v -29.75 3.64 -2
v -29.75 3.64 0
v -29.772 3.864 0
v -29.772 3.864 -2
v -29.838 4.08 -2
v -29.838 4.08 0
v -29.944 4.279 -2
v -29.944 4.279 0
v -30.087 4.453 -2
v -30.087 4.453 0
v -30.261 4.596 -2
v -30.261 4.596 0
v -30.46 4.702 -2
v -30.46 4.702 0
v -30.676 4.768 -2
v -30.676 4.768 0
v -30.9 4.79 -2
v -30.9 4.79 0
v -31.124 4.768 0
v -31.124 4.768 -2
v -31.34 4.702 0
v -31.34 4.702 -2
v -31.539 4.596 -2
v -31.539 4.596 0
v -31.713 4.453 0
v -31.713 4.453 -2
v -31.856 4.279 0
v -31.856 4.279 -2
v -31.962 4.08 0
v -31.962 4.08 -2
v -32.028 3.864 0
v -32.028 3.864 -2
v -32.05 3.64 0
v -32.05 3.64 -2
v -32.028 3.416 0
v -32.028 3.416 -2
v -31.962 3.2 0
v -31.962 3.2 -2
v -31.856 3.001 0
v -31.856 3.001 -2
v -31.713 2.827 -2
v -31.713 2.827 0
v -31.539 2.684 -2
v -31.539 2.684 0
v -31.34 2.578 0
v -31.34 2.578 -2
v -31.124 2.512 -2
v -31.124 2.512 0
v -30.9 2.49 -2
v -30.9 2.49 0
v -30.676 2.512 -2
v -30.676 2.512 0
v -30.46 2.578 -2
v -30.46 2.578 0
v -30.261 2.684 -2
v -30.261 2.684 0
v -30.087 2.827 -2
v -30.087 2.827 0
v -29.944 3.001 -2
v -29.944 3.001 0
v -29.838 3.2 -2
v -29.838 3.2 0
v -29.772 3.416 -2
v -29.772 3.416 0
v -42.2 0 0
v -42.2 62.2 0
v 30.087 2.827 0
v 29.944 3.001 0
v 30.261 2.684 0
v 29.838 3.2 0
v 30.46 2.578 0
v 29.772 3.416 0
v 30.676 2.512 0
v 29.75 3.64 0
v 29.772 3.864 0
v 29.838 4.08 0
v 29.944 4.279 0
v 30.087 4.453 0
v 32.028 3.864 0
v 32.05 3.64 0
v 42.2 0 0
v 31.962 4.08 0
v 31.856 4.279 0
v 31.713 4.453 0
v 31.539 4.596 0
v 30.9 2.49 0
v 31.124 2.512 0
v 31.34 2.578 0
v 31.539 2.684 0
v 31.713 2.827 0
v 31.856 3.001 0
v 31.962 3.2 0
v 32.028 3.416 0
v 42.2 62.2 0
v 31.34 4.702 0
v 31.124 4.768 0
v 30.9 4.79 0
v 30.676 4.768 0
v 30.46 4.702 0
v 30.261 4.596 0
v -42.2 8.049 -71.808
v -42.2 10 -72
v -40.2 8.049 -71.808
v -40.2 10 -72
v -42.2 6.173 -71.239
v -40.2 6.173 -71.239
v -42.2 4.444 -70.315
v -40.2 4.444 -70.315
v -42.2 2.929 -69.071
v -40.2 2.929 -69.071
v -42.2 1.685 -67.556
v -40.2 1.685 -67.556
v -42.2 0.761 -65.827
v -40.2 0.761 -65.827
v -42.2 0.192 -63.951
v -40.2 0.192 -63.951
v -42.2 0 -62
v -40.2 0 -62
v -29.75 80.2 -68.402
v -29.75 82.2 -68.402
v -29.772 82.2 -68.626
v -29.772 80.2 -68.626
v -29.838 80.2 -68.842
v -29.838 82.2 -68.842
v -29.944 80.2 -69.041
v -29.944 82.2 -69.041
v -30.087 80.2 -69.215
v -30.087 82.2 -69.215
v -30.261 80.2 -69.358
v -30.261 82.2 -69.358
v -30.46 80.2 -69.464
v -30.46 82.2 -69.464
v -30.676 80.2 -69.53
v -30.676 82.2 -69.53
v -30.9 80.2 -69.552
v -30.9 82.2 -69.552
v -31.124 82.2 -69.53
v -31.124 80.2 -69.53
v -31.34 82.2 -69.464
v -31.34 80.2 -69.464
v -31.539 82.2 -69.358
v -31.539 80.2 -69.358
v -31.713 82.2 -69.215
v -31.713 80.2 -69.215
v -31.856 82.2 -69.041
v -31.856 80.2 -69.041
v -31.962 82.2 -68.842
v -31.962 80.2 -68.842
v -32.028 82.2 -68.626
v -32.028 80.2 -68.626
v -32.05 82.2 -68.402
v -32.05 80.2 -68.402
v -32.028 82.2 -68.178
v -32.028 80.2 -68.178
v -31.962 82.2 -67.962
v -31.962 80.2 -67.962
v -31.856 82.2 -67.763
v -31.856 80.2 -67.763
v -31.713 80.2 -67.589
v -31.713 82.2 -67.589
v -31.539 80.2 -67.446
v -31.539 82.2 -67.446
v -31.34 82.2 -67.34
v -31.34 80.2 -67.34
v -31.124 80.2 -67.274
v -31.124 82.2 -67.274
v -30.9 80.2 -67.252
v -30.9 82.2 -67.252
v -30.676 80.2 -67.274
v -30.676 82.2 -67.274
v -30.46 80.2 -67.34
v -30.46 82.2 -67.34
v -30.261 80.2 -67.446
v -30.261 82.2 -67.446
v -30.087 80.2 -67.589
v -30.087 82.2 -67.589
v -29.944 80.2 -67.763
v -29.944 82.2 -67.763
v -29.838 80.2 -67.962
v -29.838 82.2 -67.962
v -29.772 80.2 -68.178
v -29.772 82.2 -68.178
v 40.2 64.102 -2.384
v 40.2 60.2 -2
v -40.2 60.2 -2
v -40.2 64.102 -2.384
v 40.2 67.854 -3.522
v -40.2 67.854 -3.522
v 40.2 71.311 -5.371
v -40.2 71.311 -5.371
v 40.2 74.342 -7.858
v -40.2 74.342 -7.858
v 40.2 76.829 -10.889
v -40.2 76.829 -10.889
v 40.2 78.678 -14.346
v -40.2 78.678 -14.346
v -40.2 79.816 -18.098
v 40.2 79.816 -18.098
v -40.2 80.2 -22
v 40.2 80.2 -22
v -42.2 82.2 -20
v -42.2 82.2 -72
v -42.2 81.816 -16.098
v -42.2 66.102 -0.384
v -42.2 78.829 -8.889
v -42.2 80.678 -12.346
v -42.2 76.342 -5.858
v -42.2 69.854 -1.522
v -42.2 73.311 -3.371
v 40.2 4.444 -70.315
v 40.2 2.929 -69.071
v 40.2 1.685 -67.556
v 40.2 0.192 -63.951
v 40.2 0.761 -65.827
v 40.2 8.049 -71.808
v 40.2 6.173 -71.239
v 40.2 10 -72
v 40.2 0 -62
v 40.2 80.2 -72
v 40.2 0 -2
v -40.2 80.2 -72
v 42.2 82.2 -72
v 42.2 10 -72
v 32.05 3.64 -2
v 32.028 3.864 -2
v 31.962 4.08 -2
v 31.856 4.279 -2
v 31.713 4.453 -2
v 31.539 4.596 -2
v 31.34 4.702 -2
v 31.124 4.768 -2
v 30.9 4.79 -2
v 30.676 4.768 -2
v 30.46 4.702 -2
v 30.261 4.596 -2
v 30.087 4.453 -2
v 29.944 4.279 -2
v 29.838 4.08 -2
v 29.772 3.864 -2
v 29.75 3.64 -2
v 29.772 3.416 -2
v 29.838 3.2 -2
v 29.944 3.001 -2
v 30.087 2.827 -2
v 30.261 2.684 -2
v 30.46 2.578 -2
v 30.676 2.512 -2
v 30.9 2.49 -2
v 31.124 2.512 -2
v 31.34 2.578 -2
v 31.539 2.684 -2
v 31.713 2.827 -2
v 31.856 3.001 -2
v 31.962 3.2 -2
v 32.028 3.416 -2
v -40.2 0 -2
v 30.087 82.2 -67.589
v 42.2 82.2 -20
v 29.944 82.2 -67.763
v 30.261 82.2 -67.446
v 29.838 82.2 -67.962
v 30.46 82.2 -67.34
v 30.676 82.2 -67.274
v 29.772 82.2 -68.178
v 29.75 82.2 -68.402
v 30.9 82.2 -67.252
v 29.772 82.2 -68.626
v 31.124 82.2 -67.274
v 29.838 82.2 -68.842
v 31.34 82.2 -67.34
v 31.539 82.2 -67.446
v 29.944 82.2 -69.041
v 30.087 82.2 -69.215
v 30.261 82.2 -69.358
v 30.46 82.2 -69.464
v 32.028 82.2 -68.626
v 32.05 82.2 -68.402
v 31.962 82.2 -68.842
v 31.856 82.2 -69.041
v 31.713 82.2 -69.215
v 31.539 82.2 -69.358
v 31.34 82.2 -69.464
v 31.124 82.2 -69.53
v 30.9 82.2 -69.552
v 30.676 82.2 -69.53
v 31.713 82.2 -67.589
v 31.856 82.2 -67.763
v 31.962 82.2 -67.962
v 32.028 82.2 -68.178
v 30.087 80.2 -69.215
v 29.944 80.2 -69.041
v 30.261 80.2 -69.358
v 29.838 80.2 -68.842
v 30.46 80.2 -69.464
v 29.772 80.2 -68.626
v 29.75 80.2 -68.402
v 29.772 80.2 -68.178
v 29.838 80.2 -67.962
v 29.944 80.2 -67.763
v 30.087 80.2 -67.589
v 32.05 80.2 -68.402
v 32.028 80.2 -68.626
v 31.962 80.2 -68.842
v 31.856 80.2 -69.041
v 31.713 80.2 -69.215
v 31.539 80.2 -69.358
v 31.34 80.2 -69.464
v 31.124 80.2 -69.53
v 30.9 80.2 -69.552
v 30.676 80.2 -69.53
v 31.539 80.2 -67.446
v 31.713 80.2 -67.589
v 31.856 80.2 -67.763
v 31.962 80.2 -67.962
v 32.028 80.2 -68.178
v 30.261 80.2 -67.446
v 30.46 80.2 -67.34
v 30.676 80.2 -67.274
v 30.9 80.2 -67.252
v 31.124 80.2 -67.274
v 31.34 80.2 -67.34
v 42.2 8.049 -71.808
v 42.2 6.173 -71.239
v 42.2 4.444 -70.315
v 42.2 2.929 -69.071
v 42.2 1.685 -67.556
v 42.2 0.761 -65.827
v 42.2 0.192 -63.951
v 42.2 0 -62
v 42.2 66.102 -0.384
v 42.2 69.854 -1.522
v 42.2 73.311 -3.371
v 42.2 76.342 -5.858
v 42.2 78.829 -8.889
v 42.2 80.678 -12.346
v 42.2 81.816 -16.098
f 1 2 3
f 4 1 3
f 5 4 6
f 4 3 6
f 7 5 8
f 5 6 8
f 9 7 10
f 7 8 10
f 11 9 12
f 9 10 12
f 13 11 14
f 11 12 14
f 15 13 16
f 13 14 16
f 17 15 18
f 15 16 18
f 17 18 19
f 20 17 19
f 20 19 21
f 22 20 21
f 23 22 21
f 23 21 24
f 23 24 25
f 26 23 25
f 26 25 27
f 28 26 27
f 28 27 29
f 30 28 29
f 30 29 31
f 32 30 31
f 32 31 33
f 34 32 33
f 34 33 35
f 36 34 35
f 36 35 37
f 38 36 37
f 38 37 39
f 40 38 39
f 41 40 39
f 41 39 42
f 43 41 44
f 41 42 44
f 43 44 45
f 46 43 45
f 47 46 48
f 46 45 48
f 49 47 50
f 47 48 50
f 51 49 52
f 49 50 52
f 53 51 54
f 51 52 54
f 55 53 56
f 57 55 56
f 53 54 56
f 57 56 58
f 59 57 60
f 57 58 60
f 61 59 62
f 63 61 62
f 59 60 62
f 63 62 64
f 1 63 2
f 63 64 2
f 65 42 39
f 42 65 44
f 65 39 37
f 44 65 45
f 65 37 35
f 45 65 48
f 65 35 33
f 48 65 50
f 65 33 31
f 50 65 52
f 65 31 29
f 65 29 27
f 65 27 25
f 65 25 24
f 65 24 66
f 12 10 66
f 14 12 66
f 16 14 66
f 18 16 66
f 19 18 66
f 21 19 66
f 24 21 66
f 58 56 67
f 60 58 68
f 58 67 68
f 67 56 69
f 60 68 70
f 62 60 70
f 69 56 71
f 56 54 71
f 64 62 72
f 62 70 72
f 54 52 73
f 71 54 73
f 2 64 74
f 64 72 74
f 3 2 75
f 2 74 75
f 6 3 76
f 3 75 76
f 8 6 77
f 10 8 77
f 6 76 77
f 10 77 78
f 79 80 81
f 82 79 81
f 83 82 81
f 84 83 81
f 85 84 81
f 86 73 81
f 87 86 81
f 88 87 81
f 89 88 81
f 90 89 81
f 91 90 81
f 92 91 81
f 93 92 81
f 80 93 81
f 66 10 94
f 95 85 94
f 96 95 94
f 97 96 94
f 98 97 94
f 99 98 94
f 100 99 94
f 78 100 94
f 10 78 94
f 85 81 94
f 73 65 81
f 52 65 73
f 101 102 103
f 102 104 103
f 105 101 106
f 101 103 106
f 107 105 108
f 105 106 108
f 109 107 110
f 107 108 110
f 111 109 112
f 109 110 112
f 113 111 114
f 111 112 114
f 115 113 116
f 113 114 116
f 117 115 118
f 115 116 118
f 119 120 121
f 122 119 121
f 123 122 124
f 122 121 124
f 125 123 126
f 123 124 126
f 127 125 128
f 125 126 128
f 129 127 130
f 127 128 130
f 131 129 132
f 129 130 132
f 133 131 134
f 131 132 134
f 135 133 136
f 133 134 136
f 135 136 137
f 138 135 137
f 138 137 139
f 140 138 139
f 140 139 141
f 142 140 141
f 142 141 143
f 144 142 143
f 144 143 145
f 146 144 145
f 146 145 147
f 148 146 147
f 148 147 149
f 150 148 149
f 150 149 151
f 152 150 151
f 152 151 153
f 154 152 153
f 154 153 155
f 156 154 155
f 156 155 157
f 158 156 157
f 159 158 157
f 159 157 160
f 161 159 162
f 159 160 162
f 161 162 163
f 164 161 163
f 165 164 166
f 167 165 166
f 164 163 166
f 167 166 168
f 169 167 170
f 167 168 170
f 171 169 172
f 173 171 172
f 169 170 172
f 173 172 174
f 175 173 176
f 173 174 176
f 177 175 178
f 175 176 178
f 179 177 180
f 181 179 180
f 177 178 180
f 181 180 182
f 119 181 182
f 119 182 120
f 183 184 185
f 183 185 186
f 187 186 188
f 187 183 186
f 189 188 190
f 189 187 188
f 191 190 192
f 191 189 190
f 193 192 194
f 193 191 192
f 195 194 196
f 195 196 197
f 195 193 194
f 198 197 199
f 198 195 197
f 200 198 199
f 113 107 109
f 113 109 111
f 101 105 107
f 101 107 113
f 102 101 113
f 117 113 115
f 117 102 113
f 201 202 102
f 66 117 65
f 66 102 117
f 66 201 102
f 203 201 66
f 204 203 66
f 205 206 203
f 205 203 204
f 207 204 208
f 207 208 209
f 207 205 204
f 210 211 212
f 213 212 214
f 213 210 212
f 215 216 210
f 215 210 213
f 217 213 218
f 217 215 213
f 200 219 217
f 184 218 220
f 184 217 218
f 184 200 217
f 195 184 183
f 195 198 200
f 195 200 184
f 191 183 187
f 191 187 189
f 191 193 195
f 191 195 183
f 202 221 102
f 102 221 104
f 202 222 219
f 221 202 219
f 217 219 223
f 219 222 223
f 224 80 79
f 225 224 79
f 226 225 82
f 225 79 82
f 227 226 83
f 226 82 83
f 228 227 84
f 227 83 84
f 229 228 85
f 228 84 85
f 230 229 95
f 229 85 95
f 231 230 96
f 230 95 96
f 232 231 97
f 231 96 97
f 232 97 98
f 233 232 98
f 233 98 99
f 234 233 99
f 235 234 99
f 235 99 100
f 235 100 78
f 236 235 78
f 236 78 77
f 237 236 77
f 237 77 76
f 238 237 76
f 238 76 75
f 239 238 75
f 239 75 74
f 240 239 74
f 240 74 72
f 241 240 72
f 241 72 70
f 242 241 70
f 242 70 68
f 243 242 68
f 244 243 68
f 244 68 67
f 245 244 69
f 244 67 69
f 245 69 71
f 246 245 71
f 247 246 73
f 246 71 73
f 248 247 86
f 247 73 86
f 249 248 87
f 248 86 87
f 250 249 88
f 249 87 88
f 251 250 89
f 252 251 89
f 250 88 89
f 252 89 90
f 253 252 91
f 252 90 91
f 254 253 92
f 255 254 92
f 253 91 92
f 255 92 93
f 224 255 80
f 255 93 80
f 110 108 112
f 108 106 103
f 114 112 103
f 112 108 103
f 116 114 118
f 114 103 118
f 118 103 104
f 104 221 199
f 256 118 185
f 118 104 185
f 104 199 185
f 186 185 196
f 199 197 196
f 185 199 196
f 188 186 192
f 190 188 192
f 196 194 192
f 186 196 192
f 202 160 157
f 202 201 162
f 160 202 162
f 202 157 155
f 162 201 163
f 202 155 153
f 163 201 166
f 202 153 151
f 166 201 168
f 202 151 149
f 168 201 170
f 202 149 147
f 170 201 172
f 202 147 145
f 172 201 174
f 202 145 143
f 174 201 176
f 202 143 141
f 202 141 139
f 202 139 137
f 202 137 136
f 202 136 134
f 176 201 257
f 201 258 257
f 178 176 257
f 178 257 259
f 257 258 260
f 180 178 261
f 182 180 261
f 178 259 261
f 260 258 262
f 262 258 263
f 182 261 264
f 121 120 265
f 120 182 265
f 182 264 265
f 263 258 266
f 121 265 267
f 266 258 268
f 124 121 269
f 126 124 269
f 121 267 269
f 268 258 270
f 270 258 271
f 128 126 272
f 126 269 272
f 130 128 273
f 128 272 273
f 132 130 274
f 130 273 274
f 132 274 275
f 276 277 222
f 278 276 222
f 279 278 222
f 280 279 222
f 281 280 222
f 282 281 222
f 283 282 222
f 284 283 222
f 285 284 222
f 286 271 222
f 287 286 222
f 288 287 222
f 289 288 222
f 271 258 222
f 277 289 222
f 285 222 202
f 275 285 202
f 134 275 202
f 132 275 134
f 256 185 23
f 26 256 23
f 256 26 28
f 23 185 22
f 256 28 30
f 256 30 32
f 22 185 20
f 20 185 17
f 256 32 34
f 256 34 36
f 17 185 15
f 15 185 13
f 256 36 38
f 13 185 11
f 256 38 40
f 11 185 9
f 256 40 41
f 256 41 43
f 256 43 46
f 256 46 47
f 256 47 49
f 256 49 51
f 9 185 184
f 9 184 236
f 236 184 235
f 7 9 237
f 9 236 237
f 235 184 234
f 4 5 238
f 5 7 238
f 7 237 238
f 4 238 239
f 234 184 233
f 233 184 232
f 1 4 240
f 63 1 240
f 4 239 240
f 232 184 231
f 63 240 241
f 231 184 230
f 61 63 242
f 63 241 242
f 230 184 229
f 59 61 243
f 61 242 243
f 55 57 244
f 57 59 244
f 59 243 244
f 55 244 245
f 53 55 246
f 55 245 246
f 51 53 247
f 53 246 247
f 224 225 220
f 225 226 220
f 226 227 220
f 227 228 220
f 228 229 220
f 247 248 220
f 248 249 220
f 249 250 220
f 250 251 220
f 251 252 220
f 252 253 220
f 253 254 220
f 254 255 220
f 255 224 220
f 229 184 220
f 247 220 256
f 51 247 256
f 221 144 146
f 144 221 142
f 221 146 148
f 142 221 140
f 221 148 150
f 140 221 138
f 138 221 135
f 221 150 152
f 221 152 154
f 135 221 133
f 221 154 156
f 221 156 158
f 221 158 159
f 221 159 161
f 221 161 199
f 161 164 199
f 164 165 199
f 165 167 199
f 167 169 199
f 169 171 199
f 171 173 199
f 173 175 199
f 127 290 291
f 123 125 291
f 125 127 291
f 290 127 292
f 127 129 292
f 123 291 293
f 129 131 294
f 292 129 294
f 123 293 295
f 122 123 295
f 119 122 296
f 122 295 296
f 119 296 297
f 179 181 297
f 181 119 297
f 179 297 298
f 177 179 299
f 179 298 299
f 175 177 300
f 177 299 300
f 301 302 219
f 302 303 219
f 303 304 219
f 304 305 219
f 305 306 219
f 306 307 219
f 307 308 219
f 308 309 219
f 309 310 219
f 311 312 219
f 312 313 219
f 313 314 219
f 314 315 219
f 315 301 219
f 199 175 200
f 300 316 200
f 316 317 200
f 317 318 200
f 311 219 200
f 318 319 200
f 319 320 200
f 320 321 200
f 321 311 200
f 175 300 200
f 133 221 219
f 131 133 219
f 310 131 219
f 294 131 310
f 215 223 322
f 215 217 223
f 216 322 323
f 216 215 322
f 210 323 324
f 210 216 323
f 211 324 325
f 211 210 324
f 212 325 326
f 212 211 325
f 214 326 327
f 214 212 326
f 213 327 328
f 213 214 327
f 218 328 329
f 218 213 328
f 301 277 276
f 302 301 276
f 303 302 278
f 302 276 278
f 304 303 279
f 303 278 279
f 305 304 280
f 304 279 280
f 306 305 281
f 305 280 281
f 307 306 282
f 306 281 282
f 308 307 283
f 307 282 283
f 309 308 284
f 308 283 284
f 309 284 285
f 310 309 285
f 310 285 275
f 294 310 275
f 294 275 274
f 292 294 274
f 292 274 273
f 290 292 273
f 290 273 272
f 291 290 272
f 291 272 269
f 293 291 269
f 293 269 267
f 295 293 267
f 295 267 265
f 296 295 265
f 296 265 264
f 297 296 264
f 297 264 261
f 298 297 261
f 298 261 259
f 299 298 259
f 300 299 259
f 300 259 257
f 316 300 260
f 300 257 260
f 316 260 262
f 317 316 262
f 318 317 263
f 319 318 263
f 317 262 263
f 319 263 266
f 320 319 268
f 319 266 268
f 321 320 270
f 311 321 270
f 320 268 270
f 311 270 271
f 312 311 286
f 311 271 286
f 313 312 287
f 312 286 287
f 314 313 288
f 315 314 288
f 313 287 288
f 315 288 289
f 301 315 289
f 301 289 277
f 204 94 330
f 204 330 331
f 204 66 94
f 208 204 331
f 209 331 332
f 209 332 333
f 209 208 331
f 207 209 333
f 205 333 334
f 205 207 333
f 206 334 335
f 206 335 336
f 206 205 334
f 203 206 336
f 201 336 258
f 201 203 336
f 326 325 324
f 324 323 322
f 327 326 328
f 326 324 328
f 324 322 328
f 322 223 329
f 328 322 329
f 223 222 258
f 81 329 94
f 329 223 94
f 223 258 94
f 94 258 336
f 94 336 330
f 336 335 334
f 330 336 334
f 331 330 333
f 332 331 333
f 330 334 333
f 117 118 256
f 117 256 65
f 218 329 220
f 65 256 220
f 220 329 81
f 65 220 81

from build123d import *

# Parameters (mm, degrees)
BOSS_EXTRUDE1_DEPTH = 42.2
SKETCH2_R           = 1.15
CUT_EXTRUDE1_DEPTH  = 70
FILLET1_R           = 20
BOSS_EXTRUDE2_DEPTH = 2
FILLET2_R           = 10
SKETCH4_R           = 1.15
CUT_EXTRUDE2_DEPTH  = 10


with BuildPart() as part:
    # Sketch1 → Boss-Extrude1 (new body, symmetric)
    with BuildSketch(Plane(origin=(0, 0, 0), x_dir=(0, 0, -1), z_dir=(1, 0, 0))):
        Polygon((0, 0), (0, 82.2), (72, 82.2), (72, 80.2), (2, 80.2), (2, 0), align=None)
    extrude(amount=BOSS_EXTRUDE1_DEPTH, both=True)

    # Sketch2 → Cut-Extrude1 (cut)
    with BuildSketch(Plane.XY):
        with Locations((-30.9, 3.64)):
            Circle(SKETCH2_R)
        with Locations((30.9, 3.64)):
            Circle(SKETCH2_R)
    extrude(amount=-CUT_EXTRUDE1_DEPTH, mode=Mode.SUBTRACT)

    # Fillet1
    fillet1_edges = [part.edges().sort_by_distance(p)[0] for p in [
        (0, 82.2, 0),
        (0, 80.2, -2),
    ]]
    fillet(fillet1_edges, radius=FILLET1_R)

    # Sketch3 → Boss-Extrude2 (add)
    with BuildSketch(Plane.ZY.offset(42.2)):
        with BuildLine():
            Line((-72, 80.2), (-72, 0))
            Line((-72, 0), (-2, 0))
            Line((-2, 0), (-2, 60.2))
            ThreePointArc((-2, 60.2), (-7.857864376, 74.342135624), (-22, 80.2))
            Line((-22, 80.2), (-72, 80.2))
        make_face()
    boss_extrude2 = extrude(amount=-BOSS_EXTRUDE2_DEPTH)

    # Mirror1: Boss-Extrude2 across plane
    add(boss_extrude2.mirror(Plane(origin=(0, 0, 0), x_dir=(0, 0, 1), z_dir=(1, 0, 0))))

    # Fillet2
    fillet2_edges = [part.edges().sort_by_distance(p)[0] for p in [
        (-41.2, 0, -72),
        (41.2, 0, -72),
    ]]
    fillet(fillet2_edges, radius=FILLET2_R)

    # Sketch4 → Cut-Extrude2 (cut)
    with BuildSketch(Plane(origin=(0, 82.2, 0), x_dir=(1, 0, 0), z_dir=(0, 1, 0))):
        with Locations((-30.9, 68.401968)):
            Circle(SKETCH4_R)
        with Locations((30.9, 68.401968)):
            Circle(SKETCH4_R)
    extrude(amount=-CUT_EXTRUDE2_DEPTH, mode=Mode.SUBTRACT)


solid = part.part
